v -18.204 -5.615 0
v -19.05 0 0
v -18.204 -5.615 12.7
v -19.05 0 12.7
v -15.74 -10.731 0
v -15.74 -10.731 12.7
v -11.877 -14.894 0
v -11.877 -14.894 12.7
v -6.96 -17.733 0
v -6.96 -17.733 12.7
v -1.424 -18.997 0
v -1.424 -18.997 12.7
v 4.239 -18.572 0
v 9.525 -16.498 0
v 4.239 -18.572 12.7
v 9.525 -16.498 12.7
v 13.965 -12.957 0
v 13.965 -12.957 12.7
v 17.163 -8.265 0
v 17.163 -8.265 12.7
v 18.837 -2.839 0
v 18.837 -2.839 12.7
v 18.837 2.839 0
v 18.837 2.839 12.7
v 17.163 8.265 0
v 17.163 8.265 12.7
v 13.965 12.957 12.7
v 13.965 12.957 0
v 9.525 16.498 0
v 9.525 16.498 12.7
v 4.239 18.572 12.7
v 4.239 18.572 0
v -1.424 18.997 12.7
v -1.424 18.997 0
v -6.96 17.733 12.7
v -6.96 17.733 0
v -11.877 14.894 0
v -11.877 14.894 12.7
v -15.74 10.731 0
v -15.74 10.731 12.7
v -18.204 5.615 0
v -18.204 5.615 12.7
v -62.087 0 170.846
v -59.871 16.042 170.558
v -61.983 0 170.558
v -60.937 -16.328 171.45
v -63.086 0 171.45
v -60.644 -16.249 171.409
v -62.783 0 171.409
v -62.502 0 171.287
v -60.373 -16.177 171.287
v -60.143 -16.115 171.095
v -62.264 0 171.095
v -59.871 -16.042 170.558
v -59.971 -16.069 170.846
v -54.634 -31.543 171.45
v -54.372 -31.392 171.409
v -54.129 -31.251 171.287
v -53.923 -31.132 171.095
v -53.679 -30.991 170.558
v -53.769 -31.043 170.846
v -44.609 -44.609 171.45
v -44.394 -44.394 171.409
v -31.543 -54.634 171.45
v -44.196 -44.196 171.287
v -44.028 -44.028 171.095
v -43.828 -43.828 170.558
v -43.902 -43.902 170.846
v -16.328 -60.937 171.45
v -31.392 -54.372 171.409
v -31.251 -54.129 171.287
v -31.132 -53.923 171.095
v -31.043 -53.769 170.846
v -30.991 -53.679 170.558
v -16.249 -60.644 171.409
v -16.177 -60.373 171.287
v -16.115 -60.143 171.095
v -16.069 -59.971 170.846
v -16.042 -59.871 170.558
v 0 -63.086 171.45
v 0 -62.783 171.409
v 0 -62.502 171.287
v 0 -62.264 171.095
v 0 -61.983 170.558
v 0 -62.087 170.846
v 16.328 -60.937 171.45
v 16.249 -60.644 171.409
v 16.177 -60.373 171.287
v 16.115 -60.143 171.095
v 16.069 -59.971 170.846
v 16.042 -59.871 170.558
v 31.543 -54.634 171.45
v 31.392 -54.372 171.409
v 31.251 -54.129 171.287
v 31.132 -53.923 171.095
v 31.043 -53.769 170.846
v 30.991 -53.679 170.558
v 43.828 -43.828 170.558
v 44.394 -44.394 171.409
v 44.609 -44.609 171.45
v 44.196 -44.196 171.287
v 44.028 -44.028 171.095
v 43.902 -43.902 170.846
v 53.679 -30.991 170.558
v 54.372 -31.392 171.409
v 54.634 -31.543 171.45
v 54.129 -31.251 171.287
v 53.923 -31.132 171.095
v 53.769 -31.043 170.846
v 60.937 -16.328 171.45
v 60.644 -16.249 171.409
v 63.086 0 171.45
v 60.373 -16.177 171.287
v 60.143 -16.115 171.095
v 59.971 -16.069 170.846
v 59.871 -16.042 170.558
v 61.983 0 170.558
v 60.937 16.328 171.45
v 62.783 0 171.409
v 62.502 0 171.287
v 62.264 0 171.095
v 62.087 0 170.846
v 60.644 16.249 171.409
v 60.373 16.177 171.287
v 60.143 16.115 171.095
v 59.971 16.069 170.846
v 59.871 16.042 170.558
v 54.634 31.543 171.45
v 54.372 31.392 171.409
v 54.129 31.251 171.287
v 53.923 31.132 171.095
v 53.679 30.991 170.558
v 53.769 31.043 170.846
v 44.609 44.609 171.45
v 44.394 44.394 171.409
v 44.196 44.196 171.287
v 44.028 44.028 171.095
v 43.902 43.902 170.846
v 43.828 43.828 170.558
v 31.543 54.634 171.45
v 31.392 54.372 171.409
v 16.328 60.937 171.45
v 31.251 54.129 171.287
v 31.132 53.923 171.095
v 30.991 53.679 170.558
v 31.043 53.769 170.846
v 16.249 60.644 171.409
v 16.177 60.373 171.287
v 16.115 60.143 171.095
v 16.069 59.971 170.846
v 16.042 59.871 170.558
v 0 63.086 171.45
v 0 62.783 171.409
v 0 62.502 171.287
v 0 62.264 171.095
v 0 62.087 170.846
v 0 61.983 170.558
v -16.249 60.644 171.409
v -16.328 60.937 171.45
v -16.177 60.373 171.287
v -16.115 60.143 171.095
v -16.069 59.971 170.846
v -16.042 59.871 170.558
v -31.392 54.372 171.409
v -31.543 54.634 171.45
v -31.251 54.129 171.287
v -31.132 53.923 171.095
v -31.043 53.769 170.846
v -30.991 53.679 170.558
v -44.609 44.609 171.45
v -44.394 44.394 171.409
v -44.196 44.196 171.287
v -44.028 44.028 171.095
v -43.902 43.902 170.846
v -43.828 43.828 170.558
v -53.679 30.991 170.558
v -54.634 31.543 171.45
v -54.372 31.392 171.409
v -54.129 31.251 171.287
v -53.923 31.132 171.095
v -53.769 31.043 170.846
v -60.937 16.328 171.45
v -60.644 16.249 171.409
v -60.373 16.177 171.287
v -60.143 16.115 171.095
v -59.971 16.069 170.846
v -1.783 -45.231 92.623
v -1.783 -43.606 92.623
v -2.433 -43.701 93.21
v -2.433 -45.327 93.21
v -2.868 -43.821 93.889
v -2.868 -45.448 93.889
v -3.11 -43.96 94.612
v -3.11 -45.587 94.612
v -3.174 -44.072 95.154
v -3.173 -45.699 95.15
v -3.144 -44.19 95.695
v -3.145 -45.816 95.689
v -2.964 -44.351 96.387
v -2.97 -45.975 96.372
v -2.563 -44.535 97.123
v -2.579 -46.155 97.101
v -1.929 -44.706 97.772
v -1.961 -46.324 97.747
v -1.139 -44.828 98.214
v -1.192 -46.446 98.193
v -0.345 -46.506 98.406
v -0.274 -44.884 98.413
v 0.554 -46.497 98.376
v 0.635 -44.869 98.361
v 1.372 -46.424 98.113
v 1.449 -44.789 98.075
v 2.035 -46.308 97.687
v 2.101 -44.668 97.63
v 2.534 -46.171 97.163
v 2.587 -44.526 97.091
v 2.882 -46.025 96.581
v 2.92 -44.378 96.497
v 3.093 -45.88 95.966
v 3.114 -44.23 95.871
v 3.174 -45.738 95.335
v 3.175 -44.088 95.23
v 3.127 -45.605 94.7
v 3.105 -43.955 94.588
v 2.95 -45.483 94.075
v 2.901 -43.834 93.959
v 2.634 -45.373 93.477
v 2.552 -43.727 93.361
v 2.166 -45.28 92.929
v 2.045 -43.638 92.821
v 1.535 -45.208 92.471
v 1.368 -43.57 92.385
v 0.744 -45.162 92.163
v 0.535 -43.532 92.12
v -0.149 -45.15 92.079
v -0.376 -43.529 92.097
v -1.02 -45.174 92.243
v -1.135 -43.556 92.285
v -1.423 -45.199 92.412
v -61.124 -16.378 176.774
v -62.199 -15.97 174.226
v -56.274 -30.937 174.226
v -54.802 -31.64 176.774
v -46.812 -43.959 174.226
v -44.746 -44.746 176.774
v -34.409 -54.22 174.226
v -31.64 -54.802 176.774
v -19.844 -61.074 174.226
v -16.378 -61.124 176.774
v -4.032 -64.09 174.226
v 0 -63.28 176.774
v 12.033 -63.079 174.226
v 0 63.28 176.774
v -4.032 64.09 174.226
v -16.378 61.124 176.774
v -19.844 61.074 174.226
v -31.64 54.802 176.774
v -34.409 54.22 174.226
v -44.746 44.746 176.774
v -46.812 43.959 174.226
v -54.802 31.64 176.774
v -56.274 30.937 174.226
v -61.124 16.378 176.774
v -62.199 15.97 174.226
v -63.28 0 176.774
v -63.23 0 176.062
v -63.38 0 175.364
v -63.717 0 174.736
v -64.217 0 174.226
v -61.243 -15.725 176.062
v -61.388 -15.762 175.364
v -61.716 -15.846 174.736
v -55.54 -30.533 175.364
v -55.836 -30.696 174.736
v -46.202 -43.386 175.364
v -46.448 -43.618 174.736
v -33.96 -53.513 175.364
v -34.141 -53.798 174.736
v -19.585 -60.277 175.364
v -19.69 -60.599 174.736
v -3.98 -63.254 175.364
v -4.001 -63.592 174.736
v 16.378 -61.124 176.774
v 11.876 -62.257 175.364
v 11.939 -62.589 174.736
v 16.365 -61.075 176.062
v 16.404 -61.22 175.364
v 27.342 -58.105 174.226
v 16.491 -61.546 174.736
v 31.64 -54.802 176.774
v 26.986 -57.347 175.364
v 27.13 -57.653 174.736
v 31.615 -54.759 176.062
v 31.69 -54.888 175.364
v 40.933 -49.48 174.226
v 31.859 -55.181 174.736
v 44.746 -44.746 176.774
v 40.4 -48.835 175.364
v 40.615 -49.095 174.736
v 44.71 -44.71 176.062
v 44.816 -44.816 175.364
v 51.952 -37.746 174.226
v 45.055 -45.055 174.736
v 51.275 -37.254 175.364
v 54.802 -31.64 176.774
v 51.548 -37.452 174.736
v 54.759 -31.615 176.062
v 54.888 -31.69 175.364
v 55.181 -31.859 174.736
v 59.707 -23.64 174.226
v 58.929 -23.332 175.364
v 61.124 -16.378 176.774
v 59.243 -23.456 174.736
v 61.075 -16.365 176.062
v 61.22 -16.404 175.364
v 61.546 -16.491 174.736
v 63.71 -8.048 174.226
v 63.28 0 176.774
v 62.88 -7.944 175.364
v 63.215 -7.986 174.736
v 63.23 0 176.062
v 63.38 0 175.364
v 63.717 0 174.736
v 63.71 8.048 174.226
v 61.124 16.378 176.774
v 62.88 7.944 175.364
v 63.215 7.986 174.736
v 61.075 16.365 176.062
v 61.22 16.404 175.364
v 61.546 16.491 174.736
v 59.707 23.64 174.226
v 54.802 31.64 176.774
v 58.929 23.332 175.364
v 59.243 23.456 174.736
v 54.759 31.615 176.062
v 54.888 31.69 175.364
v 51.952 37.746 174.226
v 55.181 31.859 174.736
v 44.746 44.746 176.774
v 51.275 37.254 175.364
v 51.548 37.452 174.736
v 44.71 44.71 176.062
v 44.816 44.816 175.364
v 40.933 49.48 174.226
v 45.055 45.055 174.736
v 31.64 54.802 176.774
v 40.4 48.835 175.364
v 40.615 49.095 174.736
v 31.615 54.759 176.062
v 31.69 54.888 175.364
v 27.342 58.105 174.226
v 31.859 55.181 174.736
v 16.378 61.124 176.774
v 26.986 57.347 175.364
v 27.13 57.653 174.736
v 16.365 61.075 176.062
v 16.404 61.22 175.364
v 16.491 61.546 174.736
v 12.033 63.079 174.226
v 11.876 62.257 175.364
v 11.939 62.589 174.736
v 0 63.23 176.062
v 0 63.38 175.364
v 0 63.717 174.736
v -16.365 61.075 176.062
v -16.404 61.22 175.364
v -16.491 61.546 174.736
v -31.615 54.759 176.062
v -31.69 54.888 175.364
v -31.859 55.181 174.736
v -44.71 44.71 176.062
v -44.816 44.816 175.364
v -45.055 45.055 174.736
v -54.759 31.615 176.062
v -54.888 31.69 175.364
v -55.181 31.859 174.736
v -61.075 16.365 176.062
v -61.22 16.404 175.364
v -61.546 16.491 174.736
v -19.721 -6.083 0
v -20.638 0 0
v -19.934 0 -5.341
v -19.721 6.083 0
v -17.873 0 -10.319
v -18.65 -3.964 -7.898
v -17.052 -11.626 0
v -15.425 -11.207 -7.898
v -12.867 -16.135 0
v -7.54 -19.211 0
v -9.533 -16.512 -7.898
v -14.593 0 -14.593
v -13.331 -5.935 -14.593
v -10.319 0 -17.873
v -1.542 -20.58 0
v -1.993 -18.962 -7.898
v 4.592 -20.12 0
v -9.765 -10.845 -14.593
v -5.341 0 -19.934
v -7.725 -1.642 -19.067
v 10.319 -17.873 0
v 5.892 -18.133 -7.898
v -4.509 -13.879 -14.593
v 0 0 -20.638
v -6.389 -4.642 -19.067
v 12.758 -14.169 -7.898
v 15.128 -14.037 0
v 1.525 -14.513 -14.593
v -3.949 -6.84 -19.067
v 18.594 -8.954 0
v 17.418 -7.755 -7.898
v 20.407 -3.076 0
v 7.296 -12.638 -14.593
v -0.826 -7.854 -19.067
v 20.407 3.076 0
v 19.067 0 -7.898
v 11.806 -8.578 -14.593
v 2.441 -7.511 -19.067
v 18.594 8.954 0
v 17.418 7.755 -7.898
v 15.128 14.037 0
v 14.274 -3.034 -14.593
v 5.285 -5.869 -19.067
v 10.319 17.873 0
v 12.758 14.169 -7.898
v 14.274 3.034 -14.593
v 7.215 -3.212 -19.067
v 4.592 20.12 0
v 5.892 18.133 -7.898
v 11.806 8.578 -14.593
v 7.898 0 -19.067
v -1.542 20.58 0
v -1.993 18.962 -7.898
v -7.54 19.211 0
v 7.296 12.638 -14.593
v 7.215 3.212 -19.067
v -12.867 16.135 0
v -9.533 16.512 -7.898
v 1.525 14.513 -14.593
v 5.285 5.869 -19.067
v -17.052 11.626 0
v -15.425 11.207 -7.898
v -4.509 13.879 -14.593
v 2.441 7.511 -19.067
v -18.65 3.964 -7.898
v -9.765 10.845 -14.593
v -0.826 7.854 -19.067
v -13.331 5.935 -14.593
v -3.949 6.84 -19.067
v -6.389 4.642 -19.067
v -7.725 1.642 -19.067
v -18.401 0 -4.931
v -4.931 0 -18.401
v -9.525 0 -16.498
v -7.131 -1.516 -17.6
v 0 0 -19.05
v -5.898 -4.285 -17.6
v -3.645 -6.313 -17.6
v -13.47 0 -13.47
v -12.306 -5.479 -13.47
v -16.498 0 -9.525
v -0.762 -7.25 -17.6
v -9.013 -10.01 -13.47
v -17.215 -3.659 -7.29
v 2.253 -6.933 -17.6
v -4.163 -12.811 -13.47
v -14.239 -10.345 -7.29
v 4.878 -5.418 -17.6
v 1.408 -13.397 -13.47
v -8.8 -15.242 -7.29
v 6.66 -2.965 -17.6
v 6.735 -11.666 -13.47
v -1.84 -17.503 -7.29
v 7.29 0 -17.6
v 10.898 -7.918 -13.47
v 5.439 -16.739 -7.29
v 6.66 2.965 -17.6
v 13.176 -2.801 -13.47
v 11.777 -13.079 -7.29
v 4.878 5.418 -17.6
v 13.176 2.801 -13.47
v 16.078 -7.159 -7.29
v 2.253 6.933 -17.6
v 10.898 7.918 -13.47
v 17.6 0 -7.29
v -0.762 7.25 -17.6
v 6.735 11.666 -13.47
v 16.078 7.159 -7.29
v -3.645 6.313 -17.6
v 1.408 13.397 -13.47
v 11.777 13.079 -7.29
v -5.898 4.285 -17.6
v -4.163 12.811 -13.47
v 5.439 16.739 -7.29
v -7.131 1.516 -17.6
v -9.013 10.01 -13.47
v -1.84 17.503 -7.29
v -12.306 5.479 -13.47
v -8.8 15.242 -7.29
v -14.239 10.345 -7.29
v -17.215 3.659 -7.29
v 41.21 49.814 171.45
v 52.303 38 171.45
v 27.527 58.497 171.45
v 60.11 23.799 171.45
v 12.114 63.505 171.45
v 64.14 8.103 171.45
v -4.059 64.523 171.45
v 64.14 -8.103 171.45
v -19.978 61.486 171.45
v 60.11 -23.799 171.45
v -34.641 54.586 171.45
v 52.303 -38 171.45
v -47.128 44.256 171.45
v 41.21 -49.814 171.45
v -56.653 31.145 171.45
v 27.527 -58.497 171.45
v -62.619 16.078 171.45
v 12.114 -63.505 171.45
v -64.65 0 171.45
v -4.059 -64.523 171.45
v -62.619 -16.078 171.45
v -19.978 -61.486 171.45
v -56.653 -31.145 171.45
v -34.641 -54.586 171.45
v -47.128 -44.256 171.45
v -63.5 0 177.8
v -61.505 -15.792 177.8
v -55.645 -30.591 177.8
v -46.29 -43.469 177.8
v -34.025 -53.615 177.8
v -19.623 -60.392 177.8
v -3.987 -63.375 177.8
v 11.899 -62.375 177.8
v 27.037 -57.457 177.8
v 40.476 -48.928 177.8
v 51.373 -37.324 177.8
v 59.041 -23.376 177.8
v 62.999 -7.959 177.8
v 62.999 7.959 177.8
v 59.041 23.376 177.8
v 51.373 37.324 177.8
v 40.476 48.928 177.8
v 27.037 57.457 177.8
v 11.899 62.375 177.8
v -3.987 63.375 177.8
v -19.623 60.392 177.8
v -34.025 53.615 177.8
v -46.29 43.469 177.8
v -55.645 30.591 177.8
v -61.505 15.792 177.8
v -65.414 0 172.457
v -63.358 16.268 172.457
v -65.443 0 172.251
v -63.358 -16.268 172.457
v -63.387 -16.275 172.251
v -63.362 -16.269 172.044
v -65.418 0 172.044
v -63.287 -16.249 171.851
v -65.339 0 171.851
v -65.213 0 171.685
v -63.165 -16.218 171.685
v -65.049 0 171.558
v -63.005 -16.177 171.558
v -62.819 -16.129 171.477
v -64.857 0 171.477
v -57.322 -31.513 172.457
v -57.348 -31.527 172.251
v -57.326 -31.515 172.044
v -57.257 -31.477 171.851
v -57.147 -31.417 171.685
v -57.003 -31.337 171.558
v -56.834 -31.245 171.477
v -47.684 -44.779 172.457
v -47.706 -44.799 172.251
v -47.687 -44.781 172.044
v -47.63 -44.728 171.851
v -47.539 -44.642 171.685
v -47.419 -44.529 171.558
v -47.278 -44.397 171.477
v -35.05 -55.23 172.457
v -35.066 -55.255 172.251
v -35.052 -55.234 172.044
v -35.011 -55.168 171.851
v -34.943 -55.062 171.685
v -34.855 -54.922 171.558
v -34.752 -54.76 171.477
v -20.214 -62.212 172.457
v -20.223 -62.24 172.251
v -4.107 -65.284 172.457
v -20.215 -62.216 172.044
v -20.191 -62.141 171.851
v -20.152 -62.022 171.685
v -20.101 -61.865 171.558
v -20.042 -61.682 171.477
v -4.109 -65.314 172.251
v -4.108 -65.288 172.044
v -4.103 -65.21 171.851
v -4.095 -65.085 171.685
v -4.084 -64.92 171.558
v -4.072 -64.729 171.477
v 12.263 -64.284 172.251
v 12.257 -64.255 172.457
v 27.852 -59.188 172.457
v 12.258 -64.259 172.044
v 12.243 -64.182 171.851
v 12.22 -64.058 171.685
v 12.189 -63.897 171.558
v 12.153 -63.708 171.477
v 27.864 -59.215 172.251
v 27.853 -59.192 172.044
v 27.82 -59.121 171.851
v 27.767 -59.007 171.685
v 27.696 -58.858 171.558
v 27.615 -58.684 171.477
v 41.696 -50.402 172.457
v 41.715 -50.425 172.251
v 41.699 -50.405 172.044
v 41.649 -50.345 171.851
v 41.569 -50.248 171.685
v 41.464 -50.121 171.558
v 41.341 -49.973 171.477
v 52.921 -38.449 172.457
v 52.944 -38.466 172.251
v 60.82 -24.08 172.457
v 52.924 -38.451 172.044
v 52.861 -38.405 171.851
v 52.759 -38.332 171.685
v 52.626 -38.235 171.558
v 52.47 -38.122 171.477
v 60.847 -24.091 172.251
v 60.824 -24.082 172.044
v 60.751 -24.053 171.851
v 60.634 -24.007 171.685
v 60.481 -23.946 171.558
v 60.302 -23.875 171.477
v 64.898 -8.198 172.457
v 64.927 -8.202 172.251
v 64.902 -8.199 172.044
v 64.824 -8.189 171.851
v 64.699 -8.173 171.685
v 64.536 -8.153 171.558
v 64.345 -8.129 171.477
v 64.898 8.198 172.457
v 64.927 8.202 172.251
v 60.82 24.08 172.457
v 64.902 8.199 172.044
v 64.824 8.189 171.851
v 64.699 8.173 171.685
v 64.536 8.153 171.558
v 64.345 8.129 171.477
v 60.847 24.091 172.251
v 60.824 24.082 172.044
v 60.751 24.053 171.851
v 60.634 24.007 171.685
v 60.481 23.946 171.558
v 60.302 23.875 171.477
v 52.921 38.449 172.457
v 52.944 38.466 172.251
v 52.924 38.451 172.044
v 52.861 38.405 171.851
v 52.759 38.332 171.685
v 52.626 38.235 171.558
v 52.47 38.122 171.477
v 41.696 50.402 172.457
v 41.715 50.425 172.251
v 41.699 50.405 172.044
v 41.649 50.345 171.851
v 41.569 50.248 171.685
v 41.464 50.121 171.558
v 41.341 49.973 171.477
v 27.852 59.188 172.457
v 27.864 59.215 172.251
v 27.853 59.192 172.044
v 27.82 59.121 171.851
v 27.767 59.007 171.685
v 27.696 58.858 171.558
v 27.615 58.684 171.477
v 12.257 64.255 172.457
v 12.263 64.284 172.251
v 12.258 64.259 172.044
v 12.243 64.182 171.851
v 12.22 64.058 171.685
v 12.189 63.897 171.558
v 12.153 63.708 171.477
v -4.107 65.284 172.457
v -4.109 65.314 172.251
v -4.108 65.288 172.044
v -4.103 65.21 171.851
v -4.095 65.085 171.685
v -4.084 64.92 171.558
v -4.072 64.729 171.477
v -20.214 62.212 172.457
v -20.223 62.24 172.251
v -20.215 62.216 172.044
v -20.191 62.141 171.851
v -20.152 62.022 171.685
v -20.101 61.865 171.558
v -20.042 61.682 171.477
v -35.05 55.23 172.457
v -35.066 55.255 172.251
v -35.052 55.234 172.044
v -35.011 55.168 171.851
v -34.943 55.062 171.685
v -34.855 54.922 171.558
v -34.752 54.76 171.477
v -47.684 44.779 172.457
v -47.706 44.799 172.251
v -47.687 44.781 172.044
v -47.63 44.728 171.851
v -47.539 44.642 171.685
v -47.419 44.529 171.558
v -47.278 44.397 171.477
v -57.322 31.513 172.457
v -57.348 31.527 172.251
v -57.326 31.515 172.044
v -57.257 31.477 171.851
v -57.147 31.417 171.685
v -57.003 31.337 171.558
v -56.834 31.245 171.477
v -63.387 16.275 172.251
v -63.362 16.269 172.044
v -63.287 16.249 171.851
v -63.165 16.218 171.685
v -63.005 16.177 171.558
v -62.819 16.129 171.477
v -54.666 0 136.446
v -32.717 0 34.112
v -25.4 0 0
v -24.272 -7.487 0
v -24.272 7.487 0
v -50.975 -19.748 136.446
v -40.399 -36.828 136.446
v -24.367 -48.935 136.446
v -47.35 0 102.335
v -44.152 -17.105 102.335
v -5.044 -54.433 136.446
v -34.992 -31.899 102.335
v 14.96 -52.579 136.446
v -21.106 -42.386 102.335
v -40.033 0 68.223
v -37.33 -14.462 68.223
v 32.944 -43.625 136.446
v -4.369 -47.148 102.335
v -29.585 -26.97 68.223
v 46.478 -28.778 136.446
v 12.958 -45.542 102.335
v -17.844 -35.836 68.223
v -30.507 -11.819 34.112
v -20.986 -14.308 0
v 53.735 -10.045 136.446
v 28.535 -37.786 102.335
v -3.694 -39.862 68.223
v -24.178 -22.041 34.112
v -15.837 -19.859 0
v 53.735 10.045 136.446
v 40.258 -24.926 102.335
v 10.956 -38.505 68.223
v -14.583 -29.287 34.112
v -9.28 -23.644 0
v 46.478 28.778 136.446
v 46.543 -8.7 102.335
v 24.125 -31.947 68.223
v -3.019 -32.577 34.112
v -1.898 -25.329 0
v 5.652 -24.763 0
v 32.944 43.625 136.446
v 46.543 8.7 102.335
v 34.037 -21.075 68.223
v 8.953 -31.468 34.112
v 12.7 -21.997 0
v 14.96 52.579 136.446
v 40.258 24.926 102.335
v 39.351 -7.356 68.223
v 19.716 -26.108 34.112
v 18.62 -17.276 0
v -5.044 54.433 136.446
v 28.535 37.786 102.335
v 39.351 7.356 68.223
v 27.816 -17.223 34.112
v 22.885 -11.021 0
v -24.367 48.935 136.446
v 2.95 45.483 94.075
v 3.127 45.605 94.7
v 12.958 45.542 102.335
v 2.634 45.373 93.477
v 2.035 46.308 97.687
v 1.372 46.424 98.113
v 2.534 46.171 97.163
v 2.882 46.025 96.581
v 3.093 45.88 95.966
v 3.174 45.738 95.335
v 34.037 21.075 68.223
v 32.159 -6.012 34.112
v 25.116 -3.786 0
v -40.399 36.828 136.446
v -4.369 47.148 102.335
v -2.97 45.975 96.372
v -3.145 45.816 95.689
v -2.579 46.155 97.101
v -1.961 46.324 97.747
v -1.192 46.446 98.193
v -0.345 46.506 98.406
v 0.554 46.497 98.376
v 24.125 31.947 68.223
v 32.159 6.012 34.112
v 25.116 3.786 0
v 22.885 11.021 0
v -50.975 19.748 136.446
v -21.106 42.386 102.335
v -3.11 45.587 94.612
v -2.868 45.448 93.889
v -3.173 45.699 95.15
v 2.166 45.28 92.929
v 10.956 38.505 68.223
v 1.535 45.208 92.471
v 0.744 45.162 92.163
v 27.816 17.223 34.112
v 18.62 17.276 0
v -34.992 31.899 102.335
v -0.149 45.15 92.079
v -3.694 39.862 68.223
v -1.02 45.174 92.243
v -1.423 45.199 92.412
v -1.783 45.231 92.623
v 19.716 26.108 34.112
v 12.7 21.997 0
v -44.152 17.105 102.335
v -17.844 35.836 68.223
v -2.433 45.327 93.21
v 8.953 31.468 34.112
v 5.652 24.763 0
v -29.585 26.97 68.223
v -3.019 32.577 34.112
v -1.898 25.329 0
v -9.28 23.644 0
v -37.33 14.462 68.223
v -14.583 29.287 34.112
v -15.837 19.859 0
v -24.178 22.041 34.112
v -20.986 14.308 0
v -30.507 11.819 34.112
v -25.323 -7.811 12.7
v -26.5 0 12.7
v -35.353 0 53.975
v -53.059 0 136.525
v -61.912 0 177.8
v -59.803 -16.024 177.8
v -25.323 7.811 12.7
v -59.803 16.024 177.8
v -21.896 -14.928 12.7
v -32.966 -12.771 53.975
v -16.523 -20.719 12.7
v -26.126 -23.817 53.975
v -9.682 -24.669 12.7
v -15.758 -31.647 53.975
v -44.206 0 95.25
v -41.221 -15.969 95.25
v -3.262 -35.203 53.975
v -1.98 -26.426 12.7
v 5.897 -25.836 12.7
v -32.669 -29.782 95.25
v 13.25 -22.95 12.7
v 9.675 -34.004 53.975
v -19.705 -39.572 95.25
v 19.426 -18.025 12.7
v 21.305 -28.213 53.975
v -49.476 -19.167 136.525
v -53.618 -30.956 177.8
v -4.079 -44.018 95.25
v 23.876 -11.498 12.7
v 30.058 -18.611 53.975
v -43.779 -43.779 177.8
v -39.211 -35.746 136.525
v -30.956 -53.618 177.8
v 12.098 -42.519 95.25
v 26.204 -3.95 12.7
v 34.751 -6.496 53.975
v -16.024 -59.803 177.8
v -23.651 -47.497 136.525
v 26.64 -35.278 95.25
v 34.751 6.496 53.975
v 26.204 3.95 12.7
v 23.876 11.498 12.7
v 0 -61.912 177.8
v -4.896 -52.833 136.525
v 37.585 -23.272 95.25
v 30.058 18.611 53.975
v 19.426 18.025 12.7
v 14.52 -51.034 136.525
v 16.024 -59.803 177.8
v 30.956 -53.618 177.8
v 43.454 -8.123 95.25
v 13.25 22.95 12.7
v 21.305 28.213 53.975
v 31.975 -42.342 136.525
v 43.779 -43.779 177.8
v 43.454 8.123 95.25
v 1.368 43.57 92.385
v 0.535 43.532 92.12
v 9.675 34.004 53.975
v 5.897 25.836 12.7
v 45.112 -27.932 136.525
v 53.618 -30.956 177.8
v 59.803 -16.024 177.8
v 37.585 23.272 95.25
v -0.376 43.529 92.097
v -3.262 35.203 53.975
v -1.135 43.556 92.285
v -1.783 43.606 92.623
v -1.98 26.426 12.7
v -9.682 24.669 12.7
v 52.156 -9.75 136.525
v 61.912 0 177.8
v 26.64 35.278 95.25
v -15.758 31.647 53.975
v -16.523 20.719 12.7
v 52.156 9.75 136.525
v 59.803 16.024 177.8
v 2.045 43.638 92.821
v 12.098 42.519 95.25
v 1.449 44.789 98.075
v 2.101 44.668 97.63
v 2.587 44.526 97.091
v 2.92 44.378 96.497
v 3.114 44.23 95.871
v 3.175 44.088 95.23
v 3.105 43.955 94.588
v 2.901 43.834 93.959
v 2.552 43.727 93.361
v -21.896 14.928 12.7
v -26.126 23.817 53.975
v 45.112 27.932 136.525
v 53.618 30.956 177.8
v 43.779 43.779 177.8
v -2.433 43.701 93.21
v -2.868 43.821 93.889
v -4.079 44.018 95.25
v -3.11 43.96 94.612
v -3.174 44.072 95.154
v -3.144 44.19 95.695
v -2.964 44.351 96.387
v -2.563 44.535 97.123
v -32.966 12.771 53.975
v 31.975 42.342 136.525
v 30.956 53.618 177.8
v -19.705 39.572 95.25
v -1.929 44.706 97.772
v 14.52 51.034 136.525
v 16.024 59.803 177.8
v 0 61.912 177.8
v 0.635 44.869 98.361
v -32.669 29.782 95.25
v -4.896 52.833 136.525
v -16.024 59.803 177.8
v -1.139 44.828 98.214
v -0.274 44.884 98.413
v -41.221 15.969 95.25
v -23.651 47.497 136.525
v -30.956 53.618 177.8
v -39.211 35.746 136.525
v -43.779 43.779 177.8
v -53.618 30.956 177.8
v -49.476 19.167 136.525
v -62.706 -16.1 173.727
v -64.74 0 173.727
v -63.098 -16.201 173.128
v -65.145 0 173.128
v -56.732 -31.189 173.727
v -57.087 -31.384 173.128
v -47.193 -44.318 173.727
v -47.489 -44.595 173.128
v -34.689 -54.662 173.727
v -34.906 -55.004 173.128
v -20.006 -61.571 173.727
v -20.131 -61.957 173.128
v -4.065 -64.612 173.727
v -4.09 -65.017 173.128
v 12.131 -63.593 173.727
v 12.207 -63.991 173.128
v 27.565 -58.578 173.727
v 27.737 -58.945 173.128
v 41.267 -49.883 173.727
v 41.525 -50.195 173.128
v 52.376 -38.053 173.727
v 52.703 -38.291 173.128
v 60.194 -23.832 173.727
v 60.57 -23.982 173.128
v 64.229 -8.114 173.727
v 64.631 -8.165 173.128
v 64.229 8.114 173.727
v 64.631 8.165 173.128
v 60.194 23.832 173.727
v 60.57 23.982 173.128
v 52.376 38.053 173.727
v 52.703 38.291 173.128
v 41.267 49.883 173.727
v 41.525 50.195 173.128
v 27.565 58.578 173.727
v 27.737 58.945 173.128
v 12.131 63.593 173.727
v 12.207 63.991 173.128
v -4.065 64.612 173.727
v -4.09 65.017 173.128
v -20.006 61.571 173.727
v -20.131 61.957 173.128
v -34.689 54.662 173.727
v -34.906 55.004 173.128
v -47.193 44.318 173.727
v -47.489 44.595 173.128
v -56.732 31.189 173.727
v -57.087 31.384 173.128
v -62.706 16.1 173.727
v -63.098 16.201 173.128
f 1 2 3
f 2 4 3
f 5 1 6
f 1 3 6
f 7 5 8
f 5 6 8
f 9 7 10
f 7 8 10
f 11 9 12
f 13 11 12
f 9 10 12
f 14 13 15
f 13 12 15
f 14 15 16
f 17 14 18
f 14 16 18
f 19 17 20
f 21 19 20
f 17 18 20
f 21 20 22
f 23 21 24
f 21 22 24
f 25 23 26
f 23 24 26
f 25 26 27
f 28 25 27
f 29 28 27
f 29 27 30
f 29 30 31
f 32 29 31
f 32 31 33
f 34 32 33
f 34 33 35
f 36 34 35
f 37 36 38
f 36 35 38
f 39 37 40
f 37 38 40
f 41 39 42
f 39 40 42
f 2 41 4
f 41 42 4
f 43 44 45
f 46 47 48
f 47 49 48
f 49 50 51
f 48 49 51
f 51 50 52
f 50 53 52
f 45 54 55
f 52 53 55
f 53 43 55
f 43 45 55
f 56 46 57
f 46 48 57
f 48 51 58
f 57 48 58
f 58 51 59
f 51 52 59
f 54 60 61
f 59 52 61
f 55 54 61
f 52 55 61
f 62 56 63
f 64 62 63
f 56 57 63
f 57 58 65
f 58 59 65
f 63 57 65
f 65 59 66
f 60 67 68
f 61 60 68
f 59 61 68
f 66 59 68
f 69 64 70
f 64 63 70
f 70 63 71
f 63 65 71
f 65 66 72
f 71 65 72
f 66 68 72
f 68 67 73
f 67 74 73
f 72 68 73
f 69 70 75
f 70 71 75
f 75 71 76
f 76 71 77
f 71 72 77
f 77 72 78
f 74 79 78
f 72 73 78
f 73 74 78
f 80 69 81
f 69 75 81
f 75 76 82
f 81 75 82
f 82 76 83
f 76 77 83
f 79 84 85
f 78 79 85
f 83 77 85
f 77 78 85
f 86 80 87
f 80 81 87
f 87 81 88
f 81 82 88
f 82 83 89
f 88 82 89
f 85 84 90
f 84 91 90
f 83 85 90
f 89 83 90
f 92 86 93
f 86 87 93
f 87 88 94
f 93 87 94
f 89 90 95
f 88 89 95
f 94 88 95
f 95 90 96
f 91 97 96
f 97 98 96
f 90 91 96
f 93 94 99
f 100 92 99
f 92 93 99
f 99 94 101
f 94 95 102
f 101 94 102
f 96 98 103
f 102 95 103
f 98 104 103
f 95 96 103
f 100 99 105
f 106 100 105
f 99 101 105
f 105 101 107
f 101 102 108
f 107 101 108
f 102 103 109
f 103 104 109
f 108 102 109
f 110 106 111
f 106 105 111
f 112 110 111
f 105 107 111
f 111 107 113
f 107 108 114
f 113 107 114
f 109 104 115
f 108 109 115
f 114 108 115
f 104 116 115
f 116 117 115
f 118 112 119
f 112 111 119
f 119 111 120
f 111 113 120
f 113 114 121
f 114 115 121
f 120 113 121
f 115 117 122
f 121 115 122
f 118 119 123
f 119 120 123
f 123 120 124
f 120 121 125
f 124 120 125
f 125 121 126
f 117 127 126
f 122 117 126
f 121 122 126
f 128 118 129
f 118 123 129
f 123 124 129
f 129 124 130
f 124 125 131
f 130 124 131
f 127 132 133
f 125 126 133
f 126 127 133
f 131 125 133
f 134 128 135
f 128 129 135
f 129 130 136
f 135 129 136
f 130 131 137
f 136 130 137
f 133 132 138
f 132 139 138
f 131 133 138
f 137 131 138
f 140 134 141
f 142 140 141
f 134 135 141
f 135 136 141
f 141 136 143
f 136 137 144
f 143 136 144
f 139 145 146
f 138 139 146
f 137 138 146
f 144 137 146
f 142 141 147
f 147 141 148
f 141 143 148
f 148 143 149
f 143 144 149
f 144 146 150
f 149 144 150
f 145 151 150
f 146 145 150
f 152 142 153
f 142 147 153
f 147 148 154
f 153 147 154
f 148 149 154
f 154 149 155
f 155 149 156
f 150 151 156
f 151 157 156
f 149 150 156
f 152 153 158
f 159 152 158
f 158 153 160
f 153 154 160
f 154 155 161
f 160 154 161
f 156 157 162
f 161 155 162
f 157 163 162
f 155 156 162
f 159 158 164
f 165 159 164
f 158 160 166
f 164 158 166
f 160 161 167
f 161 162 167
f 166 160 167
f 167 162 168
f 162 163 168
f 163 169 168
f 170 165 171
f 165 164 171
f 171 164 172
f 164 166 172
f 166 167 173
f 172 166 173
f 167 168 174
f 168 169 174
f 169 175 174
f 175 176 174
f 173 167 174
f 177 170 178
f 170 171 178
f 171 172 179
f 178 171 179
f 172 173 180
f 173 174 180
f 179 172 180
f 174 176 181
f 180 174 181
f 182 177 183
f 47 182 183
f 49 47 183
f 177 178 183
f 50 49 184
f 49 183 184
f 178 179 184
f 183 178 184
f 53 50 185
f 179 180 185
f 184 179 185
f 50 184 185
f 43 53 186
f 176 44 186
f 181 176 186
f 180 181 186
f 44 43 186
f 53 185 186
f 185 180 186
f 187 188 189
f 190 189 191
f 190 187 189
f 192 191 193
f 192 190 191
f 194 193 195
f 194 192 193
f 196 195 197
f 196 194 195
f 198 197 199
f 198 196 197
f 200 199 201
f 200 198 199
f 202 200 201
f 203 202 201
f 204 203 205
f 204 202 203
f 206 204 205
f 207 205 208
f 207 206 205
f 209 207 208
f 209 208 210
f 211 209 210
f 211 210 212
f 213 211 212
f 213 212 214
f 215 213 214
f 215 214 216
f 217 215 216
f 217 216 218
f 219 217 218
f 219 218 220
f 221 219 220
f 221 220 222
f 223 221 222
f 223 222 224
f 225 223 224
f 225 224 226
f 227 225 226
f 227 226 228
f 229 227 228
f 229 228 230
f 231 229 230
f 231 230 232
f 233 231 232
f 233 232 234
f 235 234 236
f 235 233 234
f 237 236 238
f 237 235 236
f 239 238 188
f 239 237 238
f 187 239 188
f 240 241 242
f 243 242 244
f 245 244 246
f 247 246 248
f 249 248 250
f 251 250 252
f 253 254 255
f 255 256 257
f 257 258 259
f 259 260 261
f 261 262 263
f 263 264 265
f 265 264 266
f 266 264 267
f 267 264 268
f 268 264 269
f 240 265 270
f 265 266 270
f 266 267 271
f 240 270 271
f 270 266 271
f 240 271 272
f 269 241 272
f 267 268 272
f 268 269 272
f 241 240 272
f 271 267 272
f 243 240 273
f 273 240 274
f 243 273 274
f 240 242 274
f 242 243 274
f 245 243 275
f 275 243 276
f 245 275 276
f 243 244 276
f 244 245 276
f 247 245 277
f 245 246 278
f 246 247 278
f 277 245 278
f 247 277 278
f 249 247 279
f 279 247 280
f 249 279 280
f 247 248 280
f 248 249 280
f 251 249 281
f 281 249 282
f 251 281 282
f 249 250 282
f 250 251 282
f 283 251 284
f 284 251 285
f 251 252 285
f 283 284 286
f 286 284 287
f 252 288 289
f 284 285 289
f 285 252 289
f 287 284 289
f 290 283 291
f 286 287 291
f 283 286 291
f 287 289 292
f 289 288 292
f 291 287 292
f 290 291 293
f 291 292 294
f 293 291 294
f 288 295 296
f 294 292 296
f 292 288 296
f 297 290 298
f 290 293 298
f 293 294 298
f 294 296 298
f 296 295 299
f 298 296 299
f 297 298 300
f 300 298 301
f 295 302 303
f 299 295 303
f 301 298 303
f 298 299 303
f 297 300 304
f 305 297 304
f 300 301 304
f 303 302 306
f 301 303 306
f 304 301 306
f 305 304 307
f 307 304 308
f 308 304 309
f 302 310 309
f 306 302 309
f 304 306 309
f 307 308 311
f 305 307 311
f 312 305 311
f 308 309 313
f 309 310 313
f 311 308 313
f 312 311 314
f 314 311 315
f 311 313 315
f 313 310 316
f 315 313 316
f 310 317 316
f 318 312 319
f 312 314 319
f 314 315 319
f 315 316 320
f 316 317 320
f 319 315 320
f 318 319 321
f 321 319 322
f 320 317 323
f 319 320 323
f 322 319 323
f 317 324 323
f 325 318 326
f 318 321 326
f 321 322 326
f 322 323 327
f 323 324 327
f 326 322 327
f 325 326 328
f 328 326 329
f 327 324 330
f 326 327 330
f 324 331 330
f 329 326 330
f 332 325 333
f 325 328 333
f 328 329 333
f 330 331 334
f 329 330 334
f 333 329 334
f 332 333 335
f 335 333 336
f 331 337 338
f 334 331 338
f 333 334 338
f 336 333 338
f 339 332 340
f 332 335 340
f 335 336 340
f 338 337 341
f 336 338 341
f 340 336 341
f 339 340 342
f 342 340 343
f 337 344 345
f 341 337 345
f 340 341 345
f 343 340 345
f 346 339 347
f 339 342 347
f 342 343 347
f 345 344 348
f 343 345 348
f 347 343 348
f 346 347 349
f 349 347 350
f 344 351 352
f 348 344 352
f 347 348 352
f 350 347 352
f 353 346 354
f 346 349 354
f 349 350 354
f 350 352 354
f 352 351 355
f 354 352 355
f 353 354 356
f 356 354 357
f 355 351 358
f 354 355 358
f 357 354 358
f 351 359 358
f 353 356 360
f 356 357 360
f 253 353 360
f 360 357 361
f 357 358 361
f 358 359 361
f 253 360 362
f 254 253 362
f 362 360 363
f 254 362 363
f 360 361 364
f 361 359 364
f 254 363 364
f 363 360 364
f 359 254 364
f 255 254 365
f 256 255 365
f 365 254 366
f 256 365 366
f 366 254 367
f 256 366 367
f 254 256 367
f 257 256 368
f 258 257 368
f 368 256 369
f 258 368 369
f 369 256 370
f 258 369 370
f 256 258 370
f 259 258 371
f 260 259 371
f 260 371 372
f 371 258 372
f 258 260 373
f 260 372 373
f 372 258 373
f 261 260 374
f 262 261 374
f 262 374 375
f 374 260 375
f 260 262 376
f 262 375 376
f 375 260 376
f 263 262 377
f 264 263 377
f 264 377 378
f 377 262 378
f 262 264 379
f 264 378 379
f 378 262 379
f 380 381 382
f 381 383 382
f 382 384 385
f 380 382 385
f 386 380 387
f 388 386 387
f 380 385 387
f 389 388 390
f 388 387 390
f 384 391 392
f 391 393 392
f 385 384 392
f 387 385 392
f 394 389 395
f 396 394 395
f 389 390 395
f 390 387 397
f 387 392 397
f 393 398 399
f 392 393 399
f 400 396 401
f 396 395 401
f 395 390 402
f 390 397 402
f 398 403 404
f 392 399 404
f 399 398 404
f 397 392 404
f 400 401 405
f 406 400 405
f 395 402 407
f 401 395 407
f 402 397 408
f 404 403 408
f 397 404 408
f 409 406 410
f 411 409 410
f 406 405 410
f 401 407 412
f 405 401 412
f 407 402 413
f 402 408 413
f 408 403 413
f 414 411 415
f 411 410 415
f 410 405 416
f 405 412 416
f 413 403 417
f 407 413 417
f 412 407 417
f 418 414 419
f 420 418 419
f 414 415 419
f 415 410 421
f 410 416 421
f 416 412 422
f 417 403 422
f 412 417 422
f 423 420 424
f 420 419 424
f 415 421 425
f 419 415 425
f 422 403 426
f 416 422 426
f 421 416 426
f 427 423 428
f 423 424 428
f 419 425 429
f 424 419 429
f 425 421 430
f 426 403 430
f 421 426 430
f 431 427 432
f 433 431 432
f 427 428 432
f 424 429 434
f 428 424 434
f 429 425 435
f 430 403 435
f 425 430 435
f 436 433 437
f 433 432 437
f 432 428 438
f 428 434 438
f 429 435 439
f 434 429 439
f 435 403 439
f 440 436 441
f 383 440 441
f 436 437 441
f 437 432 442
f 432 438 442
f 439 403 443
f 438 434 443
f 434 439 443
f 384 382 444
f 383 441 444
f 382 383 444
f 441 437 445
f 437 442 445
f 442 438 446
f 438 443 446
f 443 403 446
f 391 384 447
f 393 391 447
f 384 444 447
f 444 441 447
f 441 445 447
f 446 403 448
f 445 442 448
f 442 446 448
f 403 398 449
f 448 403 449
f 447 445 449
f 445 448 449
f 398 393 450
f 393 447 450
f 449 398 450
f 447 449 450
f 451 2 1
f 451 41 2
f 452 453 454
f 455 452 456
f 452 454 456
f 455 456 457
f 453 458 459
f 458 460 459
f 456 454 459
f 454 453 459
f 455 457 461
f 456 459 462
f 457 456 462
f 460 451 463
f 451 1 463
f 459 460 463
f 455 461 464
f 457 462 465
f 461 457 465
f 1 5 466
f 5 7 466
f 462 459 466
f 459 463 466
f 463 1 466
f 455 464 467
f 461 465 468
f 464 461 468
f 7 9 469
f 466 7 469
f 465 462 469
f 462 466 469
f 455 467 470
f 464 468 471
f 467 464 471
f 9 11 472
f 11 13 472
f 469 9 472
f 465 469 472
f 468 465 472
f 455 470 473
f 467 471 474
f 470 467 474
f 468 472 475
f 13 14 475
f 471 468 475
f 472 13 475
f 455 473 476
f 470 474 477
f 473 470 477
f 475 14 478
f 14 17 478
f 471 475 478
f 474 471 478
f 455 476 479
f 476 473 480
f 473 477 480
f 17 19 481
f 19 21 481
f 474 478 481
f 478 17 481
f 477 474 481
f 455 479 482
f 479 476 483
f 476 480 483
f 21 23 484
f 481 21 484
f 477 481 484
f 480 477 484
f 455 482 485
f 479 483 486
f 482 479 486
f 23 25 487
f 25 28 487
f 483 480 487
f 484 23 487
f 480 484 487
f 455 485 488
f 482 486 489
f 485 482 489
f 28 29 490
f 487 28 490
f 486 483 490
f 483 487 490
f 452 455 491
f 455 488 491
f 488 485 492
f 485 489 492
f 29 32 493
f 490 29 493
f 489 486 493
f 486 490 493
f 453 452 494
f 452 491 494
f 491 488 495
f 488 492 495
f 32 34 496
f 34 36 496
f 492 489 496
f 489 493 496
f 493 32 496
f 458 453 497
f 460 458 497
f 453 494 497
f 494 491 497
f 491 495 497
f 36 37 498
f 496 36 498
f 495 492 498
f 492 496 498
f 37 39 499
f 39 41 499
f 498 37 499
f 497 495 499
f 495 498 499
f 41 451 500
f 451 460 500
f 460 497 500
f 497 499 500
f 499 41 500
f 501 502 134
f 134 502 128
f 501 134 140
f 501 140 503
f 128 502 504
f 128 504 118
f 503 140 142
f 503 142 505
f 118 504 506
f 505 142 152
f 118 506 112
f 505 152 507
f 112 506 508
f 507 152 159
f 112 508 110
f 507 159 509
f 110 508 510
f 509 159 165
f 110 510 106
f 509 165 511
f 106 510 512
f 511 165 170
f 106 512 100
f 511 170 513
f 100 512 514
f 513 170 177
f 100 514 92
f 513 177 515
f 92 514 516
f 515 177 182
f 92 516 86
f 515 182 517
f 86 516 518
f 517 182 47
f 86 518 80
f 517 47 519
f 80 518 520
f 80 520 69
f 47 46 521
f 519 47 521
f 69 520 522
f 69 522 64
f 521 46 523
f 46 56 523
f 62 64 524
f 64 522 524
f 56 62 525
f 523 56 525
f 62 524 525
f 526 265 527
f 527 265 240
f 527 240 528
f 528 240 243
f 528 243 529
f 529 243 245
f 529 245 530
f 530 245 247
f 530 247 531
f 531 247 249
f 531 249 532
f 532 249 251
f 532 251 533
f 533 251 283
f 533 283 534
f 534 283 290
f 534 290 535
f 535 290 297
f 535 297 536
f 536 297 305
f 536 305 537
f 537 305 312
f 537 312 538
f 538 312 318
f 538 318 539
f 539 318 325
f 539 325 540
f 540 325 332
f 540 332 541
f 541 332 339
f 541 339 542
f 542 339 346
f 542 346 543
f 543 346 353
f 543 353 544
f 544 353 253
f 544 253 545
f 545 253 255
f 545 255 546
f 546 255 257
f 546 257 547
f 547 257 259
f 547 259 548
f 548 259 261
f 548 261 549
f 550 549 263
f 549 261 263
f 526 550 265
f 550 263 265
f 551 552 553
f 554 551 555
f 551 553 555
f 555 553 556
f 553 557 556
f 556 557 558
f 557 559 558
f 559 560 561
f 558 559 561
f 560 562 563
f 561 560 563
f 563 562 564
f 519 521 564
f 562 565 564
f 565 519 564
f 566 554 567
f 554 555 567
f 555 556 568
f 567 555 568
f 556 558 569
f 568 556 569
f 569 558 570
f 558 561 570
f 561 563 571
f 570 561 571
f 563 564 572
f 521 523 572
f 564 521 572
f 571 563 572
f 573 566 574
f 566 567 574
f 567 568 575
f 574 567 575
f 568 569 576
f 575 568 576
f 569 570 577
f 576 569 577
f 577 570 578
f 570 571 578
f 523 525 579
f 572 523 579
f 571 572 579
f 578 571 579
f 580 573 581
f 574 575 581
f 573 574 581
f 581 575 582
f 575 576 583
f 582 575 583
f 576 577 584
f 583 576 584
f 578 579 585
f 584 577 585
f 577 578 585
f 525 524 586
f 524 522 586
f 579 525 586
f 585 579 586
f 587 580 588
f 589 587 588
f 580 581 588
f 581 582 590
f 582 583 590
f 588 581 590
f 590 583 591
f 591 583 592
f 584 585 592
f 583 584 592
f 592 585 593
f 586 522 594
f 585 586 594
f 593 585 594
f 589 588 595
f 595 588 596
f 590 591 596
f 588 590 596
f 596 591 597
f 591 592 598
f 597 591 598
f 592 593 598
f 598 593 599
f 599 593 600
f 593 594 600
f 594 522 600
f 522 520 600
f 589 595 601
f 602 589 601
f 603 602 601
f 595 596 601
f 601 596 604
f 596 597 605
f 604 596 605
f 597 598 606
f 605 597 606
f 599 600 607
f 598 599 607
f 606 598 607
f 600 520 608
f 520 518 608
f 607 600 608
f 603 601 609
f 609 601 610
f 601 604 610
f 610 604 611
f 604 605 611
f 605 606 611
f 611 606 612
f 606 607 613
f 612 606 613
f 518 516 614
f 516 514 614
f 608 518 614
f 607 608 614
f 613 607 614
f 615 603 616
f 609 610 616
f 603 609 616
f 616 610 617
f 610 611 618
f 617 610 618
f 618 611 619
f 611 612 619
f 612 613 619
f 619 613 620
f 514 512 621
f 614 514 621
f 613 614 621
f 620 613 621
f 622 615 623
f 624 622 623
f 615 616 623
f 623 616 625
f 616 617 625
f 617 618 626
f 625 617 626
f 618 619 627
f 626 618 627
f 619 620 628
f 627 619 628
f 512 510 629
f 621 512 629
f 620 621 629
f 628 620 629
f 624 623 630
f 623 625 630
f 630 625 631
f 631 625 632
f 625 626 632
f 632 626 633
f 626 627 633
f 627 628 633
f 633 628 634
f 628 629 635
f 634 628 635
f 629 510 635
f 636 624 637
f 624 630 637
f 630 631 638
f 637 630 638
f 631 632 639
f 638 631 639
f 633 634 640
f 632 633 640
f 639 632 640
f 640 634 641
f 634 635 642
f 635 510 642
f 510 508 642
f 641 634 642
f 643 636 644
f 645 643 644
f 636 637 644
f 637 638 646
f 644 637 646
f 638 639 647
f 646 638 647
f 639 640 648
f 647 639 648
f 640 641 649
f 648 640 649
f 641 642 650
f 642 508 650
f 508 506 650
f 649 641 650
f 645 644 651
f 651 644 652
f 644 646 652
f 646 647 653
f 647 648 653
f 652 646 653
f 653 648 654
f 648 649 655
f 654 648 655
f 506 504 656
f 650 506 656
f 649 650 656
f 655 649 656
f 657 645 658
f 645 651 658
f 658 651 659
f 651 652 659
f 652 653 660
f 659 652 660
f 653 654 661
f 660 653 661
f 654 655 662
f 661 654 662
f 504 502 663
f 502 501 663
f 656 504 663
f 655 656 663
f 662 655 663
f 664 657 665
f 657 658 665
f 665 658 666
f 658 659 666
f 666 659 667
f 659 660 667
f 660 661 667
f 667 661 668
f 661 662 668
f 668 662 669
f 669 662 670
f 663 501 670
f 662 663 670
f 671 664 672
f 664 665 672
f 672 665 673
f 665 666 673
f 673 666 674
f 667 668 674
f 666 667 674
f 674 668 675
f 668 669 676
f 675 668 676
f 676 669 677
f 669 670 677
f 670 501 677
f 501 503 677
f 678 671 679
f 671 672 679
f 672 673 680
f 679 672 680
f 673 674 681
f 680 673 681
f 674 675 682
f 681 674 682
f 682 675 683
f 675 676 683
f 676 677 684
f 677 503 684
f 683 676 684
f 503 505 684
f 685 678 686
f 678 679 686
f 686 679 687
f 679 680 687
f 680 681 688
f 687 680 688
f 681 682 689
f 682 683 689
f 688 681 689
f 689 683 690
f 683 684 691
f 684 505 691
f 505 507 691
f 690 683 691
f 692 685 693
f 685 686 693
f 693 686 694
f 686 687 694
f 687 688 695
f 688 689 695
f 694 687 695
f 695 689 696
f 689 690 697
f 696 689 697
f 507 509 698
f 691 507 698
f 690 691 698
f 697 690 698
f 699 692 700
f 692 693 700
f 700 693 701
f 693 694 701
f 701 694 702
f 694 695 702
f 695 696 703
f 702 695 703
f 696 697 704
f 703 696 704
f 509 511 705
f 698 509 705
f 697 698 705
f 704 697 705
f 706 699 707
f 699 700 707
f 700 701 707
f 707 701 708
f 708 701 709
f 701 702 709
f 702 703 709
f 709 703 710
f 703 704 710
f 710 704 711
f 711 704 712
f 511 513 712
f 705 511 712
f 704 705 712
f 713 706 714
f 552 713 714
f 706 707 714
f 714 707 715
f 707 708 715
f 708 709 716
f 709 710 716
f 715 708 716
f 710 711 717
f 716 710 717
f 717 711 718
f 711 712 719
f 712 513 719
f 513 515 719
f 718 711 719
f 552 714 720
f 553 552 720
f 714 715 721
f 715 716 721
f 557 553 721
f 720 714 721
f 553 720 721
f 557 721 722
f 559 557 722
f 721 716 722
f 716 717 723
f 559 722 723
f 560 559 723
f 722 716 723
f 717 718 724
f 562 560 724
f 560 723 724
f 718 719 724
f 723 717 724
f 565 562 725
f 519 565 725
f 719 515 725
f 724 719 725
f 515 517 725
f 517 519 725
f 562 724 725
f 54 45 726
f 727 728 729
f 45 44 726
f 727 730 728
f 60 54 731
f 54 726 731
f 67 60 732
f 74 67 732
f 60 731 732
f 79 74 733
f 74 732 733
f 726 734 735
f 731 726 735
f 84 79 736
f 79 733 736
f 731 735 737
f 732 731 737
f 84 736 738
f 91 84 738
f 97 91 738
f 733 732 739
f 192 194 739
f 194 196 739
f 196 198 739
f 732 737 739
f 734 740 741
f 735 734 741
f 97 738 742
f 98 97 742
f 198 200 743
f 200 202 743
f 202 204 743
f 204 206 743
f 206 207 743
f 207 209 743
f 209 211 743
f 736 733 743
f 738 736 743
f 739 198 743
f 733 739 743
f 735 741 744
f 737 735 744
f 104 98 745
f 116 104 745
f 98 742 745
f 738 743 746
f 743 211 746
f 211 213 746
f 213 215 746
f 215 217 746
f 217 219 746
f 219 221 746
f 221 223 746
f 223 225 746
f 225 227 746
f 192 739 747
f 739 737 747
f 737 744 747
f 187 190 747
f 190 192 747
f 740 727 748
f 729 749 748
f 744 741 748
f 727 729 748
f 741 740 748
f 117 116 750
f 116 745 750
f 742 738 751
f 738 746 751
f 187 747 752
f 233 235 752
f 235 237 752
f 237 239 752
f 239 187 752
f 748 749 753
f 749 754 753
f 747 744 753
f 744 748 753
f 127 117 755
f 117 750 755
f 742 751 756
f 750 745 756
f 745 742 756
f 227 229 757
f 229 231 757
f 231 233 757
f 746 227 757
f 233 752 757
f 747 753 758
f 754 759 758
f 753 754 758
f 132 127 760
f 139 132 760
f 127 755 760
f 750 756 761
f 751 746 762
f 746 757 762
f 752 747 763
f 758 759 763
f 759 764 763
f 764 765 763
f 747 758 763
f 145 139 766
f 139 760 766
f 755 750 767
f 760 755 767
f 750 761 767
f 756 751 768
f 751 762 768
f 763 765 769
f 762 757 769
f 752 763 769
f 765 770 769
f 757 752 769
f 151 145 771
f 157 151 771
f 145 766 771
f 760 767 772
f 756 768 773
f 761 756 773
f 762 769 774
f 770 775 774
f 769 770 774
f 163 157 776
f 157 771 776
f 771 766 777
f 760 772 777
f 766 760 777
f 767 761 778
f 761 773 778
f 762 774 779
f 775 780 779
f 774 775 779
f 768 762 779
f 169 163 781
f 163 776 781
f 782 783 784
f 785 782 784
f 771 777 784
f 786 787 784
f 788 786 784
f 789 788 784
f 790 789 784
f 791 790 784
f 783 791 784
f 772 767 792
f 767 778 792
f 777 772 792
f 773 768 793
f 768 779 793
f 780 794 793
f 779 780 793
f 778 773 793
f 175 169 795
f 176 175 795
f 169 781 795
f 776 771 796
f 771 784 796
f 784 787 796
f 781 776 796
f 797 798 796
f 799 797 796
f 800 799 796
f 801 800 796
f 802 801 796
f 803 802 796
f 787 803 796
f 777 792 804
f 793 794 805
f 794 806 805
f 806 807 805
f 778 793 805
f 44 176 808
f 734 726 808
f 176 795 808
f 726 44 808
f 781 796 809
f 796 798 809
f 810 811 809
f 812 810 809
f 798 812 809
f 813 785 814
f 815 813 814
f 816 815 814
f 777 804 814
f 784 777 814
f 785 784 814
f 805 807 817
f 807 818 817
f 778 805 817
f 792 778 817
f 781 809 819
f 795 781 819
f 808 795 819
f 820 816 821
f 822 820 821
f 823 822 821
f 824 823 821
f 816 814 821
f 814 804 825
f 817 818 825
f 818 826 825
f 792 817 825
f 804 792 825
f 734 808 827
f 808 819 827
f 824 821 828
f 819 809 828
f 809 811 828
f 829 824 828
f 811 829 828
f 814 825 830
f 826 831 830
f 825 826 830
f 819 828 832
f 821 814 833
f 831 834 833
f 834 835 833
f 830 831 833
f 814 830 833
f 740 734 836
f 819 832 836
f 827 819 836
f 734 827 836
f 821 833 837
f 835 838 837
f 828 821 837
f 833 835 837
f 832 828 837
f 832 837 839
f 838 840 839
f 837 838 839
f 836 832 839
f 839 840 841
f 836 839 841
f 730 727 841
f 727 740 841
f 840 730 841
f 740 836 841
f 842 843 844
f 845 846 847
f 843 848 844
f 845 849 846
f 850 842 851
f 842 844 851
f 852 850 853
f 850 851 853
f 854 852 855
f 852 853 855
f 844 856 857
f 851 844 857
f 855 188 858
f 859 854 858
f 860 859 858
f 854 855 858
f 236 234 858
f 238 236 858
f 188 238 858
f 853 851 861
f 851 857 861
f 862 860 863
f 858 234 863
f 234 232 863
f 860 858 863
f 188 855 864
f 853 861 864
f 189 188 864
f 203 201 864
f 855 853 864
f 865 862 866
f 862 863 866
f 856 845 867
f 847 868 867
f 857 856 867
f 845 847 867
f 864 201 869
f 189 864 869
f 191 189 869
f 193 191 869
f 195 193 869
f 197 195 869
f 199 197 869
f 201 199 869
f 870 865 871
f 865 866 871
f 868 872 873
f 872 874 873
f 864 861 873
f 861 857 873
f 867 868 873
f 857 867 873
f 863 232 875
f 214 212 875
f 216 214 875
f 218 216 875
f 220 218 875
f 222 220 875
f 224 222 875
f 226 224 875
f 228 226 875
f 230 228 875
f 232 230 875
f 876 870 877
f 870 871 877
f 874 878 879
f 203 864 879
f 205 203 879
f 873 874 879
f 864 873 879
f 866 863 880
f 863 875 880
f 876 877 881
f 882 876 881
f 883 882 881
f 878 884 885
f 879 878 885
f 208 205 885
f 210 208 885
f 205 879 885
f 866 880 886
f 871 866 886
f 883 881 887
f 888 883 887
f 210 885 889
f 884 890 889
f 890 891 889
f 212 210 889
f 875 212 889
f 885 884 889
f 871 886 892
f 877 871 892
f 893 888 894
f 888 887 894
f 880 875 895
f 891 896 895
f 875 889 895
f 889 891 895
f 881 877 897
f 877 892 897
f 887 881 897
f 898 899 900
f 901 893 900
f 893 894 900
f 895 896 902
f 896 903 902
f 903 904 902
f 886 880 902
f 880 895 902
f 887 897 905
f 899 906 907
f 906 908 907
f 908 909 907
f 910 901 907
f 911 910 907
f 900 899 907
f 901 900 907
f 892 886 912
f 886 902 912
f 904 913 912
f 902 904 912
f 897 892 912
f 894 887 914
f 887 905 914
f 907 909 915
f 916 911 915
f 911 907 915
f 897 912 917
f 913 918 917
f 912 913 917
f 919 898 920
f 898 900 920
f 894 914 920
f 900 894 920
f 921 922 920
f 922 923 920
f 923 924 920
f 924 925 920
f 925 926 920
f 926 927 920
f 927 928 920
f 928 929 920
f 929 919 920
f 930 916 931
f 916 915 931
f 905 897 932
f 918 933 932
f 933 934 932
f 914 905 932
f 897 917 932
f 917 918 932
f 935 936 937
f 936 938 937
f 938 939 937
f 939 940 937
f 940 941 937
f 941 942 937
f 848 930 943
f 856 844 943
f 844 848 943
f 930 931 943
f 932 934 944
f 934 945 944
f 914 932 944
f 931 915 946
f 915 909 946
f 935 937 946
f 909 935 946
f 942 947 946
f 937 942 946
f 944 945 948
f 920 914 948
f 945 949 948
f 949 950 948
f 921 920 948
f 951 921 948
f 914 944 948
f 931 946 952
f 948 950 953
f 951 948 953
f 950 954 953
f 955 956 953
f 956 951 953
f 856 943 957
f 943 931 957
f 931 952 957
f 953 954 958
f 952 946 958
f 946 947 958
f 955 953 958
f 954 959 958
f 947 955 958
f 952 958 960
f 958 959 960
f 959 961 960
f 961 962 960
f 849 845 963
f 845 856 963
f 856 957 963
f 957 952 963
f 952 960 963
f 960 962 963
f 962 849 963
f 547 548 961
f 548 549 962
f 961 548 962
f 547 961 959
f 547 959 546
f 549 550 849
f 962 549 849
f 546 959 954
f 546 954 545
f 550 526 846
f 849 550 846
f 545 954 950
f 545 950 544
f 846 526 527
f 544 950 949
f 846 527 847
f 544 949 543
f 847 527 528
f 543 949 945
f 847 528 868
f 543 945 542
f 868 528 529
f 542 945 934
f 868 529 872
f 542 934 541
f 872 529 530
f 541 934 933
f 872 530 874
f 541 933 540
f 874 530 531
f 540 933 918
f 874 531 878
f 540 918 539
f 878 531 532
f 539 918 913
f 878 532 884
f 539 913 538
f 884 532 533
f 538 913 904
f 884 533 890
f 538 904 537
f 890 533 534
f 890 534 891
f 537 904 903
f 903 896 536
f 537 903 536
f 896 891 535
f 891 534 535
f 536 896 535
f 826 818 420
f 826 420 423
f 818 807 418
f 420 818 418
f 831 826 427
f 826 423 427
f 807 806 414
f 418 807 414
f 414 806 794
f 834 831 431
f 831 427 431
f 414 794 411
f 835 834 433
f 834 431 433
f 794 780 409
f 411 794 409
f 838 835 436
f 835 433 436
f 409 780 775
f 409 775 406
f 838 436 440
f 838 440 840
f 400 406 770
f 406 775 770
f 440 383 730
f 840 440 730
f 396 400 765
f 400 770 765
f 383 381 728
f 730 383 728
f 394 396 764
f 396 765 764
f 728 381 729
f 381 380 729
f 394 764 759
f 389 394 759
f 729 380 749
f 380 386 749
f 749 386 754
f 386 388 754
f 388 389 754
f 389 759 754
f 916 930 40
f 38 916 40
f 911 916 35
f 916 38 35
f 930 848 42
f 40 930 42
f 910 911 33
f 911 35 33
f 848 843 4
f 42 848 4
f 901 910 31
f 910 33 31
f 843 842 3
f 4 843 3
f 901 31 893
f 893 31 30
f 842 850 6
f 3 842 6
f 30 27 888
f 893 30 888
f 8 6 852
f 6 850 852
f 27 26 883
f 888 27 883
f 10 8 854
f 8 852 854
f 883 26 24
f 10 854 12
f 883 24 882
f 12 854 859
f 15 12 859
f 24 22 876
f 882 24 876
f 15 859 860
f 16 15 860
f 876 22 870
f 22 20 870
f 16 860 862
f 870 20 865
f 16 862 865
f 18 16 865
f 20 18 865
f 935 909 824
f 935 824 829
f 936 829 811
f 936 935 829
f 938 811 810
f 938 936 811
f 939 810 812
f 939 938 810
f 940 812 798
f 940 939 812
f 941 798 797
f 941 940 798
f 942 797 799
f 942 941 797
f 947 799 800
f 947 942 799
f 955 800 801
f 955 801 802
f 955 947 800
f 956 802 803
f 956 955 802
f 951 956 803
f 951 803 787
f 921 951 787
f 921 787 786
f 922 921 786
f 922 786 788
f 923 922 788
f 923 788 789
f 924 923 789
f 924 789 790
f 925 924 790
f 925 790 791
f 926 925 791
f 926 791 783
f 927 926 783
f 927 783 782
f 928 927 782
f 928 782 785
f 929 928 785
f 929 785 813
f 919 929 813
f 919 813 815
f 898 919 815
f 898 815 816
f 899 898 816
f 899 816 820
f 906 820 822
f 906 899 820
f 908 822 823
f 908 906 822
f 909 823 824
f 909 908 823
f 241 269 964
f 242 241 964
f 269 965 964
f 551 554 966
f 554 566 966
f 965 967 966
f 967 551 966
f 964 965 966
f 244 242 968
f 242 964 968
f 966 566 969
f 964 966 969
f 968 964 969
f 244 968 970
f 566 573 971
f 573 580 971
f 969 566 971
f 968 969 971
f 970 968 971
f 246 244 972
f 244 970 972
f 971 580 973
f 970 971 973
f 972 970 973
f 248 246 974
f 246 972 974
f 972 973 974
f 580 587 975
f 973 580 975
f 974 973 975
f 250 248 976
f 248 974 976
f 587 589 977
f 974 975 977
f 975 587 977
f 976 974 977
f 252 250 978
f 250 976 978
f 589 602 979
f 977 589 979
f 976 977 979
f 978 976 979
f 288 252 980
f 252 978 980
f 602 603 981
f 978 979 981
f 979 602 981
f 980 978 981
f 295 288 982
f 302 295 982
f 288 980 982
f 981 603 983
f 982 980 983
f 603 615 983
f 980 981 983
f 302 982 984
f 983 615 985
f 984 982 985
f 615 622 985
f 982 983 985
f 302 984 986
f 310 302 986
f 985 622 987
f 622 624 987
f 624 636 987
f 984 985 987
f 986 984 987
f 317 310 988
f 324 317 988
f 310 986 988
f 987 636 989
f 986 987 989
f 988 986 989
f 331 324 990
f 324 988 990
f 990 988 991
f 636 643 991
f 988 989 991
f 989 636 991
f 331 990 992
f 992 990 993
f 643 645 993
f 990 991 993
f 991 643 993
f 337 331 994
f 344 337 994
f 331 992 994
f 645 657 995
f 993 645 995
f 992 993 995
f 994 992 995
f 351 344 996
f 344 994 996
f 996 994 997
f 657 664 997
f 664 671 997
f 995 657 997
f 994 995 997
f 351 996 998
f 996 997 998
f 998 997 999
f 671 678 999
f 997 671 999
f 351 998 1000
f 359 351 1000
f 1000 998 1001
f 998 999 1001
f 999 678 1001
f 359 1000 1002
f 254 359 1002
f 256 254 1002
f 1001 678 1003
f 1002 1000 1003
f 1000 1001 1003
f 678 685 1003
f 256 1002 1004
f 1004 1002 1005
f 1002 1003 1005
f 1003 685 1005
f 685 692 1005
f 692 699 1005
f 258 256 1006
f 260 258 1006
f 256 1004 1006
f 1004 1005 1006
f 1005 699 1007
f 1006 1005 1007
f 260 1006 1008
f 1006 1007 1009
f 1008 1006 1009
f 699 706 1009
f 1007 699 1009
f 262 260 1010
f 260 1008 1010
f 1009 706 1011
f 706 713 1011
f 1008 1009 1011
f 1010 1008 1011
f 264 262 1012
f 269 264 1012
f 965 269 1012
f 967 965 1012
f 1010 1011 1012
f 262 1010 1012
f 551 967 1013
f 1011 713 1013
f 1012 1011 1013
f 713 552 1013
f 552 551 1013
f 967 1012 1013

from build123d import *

# Parameters (mm, degrees)
CUT_EXTRUDE1_DEPTH      = 201.445503114
CUT_EXTRUDE1_DEPTH_BACK = 201.445503114
SKETCH2_R               = 3.175


with BuildPart() as part:
    # Sketch1 → Revolve1 (revolve)
    with BuildSketch(Plane(origin=(0, 0, 0), x_dir=(0, 0, -1), z_dir=(1, 0, 0)), mode=Mode.PRIVATE) as revolve1_sk:
        with BuildLine():
            Line((-170.558103969, 61.982800726), (0, 25.4))
            Line((0, 25.4), (0, 20.6375))
            ThreePointArc((0, 20.6375), (14.592916197, 14.592916197), (20.6375, 0))
            Line((20.6375, 0), (19.05, 0))
            ThreePointArc((19.05, 0), (13.470384182, 13.470384182), (0, 19.05))
            Line((0, 19.05), (-12.7, 19.05))
            Line((-12.7, 19.05), (-12.7, 26.500401371))
            Line((-12.7, 26.500401371), (-177.8, 61.9125))
            Line((-177.8, 61.9125), (-177.8, 63.5))
            Line((-177.8, 63.5), (-176.773784801, 63.279888347))
            ThreePointArc((-176.773784801, 63.279888347), (-175.364378816, 63.379506676), (-174.226260414, 64.21678533))
            ThreePointArc((-174.226260414, 64.21678533), (-173.438552848, 64.958591119), (-172.456828691, 65.413538059))
            ThreePointArc((-172.456828691, 65.413538059), (-171.763807138, 65.28185552), (-171.45, 64.650076885))
            Line((-171.45, 64.650076885), (-171.45, 63.086283803))
            ThreePointArc((-171.45, 63.086283803), (-171.199147092, 62.376855612), (-170.558103969, 61.982800726))
        make_face()
    revolve(revolve1_sk.sketch.rotate(Axis((0, 0, 0), (0, 0, 1)), 90), axis=Axis((0, 0, 0), (0, 0, 1)))

    # Sketch2 → Cut-Extrude1 (cut, two sides: drawn at the far end of the back side and taken through both)
    with BuildSketch(Plane(origin=(0, 0, 0), x_dir=(1, 0, 0), z_dir=(0, 1, 0)).offset(-CUT_EXTRUDE1_DEPTH_BACK)):
        with Locations(Location((0, -95.25, 0), (0, 0, 124.156091497))):
            Circle(SKETCH2_R)
    extrude(amount=CUT_EXTRUDE1_DEPTH + CUT_EXTRUDE1_DEPTH_BACK, mode=Mode.SUBTRACT)


solid = part.part
